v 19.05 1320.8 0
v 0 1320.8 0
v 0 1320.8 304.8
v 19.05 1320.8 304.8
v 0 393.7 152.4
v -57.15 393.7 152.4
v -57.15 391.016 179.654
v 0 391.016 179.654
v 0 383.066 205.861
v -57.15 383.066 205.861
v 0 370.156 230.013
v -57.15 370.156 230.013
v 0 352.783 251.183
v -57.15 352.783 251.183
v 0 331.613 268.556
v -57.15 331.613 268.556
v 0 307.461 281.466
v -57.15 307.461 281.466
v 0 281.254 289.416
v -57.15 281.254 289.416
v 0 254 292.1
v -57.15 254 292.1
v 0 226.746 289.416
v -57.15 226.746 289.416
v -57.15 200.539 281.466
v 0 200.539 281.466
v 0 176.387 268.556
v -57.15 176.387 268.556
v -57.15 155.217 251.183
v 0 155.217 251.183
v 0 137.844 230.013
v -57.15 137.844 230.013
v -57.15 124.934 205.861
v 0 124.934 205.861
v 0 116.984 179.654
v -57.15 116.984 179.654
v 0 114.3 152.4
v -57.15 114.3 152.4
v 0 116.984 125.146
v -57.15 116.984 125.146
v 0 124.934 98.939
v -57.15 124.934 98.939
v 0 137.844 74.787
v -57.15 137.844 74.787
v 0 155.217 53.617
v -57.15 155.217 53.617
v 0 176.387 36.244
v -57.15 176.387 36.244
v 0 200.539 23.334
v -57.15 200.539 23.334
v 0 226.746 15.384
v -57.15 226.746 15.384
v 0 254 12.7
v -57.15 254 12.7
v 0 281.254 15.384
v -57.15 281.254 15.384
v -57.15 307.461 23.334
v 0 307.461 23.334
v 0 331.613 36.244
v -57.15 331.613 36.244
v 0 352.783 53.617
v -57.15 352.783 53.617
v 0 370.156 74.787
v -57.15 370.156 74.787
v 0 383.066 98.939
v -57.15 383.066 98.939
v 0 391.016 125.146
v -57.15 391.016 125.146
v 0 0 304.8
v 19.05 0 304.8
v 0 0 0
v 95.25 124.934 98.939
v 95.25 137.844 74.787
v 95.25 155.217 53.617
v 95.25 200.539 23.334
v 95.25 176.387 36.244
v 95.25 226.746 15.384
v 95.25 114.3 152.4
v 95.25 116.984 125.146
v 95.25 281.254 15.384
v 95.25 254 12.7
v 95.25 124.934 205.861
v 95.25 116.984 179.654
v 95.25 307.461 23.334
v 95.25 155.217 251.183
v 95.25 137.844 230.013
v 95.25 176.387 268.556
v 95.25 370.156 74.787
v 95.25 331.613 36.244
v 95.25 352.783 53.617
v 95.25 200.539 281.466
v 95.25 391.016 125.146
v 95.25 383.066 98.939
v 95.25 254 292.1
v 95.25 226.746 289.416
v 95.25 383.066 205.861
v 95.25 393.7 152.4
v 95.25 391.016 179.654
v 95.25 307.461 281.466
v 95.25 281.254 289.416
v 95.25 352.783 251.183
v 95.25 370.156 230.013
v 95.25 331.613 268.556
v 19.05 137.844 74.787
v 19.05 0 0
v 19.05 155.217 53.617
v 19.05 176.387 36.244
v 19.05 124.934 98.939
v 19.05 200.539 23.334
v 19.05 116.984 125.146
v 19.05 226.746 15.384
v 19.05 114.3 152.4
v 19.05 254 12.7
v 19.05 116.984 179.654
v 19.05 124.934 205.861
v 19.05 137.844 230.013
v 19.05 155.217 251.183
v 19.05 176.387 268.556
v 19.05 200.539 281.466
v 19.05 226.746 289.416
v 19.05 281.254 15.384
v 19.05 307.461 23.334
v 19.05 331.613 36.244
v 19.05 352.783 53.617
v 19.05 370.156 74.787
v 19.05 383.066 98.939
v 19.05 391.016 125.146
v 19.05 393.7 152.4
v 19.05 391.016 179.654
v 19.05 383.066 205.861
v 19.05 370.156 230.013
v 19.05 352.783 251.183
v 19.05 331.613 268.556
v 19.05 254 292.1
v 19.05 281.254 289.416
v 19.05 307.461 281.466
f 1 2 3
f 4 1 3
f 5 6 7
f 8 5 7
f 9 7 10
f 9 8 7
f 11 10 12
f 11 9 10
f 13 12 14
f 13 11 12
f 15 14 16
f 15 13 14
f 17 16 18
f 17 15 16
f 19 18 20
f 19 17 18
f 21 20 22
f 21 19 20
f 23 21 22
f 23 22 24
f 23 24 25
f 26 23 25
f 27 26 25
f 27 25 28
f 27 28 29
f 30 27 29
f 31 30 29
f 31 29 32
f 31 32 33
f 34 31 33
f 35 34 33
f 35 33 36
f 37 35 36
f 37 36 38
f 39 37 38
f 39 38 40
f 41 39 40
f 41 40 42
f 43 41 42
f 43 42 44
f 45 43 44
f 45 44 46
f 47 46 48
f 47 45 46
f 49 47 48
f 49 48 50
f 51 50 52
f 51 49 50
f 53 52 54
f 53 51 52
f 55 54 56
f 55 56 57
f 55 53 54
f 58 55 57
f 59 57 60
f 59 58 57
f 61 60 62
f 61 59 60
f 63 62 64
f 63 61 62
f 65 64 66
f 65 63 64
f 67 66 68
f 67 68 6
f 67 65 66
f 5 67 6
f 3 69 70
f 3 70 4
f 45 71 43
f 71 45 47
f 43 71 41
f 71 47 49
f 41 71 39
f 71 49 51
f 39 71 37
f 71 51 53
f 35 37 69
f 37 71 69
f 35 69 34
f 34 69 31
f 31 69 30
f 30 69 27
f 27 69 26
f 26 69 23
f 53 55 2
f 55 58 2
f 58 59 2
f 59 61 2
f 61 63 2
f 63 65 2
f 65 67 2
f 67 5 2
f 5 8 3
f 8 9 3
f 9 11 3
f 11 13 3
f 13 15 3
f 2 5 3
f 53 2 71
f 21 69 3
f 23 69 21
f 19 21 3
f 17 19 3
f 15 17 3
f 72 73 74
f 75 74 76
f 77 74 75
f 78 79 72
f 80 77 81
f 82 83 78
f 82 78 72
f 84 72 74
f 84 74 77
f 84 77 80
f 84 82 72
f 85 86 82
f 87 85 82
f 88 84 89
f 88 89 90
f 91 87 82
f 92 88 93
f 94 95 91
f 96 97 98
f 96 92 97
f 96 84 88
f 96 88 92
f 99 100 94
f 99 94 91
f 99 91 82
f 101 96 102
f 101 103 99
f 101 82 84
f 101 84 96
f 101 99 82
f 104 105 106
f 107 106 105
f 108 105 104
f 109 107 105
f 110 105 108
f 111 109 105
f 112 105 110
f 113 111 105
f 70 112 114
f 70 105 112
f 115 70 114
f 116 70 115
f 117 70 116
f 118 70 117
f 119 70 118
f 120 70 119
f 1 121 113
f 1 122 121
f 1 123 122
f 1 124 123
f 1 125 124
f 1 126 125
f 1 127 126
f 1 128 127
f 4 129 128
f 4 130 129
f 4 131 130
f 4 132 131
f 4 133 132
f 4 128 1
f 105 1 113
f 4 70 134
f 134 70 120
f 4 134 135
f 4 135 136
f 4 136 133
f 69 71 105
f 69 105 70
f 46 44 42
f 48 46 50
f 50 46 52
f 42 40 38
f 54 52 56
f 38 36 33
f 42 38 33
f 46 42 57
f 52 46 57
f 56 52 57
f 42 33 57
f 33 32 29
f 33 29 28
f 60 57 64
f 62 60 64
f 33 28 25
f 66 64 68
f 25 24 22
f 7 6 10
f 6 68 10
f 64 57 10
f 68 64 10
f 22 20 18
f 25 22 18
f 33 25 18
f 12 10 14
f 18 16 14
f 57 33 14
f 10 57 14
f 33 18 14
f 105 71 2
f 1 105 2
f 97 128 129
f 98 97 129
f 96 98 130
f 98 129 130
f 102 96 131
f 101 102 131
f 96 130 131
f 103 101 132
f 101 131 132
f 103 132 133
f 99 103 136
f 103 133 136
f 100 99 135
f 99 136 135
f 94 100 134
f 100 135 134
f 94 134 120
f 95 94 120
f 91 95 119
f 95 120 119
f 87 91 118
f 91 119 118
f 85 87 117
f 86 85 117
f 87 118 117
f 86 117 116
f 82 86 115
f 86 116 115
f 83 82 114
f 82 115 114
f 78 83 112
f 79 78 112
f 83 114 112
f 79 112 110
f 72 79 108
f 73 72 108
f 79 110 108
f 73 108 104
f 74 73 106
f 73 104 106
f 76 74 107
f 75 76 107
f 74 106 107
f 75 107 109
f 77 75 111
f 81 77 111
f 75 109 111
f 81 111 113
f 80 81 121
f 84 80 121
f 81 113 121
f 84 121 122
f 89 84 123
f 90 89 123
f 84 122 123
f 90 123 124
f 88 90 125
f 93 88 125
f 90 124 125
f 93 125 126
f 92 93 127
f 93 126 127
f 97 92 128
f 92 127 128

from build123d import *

# Parameters (mm, degrees)
F0_W          = 1320.8
F0_H          = 304.8
F1_DEPTH      = 19.05
F2_R          = 139.7
F3_DEPTH      = 76.2
F3_DEPTH_BACK = 76.2


with BuildPart() as f1:
    # F0 (on Right) → F1 (new body)
    with BuildSketch(Plane.YZ):
        with Locations((660.4, 152.4)):
            Rectangle(F0_W, F0_H)
    extrude(amount=F1_DEPTH)

    # F2 (on face) → F3 (join, two sides)
    with BuildSketch(Plane.YZ.offset(19.05)) as f3_sk:
        with Locations((254, 152.4)):
            Circle(F2_R)
    extrude(amount=F3_DEPTH)
    extrude(f3_sk.sketch, amount=-F3_DEPTH_BACK)


solid = f1.part
